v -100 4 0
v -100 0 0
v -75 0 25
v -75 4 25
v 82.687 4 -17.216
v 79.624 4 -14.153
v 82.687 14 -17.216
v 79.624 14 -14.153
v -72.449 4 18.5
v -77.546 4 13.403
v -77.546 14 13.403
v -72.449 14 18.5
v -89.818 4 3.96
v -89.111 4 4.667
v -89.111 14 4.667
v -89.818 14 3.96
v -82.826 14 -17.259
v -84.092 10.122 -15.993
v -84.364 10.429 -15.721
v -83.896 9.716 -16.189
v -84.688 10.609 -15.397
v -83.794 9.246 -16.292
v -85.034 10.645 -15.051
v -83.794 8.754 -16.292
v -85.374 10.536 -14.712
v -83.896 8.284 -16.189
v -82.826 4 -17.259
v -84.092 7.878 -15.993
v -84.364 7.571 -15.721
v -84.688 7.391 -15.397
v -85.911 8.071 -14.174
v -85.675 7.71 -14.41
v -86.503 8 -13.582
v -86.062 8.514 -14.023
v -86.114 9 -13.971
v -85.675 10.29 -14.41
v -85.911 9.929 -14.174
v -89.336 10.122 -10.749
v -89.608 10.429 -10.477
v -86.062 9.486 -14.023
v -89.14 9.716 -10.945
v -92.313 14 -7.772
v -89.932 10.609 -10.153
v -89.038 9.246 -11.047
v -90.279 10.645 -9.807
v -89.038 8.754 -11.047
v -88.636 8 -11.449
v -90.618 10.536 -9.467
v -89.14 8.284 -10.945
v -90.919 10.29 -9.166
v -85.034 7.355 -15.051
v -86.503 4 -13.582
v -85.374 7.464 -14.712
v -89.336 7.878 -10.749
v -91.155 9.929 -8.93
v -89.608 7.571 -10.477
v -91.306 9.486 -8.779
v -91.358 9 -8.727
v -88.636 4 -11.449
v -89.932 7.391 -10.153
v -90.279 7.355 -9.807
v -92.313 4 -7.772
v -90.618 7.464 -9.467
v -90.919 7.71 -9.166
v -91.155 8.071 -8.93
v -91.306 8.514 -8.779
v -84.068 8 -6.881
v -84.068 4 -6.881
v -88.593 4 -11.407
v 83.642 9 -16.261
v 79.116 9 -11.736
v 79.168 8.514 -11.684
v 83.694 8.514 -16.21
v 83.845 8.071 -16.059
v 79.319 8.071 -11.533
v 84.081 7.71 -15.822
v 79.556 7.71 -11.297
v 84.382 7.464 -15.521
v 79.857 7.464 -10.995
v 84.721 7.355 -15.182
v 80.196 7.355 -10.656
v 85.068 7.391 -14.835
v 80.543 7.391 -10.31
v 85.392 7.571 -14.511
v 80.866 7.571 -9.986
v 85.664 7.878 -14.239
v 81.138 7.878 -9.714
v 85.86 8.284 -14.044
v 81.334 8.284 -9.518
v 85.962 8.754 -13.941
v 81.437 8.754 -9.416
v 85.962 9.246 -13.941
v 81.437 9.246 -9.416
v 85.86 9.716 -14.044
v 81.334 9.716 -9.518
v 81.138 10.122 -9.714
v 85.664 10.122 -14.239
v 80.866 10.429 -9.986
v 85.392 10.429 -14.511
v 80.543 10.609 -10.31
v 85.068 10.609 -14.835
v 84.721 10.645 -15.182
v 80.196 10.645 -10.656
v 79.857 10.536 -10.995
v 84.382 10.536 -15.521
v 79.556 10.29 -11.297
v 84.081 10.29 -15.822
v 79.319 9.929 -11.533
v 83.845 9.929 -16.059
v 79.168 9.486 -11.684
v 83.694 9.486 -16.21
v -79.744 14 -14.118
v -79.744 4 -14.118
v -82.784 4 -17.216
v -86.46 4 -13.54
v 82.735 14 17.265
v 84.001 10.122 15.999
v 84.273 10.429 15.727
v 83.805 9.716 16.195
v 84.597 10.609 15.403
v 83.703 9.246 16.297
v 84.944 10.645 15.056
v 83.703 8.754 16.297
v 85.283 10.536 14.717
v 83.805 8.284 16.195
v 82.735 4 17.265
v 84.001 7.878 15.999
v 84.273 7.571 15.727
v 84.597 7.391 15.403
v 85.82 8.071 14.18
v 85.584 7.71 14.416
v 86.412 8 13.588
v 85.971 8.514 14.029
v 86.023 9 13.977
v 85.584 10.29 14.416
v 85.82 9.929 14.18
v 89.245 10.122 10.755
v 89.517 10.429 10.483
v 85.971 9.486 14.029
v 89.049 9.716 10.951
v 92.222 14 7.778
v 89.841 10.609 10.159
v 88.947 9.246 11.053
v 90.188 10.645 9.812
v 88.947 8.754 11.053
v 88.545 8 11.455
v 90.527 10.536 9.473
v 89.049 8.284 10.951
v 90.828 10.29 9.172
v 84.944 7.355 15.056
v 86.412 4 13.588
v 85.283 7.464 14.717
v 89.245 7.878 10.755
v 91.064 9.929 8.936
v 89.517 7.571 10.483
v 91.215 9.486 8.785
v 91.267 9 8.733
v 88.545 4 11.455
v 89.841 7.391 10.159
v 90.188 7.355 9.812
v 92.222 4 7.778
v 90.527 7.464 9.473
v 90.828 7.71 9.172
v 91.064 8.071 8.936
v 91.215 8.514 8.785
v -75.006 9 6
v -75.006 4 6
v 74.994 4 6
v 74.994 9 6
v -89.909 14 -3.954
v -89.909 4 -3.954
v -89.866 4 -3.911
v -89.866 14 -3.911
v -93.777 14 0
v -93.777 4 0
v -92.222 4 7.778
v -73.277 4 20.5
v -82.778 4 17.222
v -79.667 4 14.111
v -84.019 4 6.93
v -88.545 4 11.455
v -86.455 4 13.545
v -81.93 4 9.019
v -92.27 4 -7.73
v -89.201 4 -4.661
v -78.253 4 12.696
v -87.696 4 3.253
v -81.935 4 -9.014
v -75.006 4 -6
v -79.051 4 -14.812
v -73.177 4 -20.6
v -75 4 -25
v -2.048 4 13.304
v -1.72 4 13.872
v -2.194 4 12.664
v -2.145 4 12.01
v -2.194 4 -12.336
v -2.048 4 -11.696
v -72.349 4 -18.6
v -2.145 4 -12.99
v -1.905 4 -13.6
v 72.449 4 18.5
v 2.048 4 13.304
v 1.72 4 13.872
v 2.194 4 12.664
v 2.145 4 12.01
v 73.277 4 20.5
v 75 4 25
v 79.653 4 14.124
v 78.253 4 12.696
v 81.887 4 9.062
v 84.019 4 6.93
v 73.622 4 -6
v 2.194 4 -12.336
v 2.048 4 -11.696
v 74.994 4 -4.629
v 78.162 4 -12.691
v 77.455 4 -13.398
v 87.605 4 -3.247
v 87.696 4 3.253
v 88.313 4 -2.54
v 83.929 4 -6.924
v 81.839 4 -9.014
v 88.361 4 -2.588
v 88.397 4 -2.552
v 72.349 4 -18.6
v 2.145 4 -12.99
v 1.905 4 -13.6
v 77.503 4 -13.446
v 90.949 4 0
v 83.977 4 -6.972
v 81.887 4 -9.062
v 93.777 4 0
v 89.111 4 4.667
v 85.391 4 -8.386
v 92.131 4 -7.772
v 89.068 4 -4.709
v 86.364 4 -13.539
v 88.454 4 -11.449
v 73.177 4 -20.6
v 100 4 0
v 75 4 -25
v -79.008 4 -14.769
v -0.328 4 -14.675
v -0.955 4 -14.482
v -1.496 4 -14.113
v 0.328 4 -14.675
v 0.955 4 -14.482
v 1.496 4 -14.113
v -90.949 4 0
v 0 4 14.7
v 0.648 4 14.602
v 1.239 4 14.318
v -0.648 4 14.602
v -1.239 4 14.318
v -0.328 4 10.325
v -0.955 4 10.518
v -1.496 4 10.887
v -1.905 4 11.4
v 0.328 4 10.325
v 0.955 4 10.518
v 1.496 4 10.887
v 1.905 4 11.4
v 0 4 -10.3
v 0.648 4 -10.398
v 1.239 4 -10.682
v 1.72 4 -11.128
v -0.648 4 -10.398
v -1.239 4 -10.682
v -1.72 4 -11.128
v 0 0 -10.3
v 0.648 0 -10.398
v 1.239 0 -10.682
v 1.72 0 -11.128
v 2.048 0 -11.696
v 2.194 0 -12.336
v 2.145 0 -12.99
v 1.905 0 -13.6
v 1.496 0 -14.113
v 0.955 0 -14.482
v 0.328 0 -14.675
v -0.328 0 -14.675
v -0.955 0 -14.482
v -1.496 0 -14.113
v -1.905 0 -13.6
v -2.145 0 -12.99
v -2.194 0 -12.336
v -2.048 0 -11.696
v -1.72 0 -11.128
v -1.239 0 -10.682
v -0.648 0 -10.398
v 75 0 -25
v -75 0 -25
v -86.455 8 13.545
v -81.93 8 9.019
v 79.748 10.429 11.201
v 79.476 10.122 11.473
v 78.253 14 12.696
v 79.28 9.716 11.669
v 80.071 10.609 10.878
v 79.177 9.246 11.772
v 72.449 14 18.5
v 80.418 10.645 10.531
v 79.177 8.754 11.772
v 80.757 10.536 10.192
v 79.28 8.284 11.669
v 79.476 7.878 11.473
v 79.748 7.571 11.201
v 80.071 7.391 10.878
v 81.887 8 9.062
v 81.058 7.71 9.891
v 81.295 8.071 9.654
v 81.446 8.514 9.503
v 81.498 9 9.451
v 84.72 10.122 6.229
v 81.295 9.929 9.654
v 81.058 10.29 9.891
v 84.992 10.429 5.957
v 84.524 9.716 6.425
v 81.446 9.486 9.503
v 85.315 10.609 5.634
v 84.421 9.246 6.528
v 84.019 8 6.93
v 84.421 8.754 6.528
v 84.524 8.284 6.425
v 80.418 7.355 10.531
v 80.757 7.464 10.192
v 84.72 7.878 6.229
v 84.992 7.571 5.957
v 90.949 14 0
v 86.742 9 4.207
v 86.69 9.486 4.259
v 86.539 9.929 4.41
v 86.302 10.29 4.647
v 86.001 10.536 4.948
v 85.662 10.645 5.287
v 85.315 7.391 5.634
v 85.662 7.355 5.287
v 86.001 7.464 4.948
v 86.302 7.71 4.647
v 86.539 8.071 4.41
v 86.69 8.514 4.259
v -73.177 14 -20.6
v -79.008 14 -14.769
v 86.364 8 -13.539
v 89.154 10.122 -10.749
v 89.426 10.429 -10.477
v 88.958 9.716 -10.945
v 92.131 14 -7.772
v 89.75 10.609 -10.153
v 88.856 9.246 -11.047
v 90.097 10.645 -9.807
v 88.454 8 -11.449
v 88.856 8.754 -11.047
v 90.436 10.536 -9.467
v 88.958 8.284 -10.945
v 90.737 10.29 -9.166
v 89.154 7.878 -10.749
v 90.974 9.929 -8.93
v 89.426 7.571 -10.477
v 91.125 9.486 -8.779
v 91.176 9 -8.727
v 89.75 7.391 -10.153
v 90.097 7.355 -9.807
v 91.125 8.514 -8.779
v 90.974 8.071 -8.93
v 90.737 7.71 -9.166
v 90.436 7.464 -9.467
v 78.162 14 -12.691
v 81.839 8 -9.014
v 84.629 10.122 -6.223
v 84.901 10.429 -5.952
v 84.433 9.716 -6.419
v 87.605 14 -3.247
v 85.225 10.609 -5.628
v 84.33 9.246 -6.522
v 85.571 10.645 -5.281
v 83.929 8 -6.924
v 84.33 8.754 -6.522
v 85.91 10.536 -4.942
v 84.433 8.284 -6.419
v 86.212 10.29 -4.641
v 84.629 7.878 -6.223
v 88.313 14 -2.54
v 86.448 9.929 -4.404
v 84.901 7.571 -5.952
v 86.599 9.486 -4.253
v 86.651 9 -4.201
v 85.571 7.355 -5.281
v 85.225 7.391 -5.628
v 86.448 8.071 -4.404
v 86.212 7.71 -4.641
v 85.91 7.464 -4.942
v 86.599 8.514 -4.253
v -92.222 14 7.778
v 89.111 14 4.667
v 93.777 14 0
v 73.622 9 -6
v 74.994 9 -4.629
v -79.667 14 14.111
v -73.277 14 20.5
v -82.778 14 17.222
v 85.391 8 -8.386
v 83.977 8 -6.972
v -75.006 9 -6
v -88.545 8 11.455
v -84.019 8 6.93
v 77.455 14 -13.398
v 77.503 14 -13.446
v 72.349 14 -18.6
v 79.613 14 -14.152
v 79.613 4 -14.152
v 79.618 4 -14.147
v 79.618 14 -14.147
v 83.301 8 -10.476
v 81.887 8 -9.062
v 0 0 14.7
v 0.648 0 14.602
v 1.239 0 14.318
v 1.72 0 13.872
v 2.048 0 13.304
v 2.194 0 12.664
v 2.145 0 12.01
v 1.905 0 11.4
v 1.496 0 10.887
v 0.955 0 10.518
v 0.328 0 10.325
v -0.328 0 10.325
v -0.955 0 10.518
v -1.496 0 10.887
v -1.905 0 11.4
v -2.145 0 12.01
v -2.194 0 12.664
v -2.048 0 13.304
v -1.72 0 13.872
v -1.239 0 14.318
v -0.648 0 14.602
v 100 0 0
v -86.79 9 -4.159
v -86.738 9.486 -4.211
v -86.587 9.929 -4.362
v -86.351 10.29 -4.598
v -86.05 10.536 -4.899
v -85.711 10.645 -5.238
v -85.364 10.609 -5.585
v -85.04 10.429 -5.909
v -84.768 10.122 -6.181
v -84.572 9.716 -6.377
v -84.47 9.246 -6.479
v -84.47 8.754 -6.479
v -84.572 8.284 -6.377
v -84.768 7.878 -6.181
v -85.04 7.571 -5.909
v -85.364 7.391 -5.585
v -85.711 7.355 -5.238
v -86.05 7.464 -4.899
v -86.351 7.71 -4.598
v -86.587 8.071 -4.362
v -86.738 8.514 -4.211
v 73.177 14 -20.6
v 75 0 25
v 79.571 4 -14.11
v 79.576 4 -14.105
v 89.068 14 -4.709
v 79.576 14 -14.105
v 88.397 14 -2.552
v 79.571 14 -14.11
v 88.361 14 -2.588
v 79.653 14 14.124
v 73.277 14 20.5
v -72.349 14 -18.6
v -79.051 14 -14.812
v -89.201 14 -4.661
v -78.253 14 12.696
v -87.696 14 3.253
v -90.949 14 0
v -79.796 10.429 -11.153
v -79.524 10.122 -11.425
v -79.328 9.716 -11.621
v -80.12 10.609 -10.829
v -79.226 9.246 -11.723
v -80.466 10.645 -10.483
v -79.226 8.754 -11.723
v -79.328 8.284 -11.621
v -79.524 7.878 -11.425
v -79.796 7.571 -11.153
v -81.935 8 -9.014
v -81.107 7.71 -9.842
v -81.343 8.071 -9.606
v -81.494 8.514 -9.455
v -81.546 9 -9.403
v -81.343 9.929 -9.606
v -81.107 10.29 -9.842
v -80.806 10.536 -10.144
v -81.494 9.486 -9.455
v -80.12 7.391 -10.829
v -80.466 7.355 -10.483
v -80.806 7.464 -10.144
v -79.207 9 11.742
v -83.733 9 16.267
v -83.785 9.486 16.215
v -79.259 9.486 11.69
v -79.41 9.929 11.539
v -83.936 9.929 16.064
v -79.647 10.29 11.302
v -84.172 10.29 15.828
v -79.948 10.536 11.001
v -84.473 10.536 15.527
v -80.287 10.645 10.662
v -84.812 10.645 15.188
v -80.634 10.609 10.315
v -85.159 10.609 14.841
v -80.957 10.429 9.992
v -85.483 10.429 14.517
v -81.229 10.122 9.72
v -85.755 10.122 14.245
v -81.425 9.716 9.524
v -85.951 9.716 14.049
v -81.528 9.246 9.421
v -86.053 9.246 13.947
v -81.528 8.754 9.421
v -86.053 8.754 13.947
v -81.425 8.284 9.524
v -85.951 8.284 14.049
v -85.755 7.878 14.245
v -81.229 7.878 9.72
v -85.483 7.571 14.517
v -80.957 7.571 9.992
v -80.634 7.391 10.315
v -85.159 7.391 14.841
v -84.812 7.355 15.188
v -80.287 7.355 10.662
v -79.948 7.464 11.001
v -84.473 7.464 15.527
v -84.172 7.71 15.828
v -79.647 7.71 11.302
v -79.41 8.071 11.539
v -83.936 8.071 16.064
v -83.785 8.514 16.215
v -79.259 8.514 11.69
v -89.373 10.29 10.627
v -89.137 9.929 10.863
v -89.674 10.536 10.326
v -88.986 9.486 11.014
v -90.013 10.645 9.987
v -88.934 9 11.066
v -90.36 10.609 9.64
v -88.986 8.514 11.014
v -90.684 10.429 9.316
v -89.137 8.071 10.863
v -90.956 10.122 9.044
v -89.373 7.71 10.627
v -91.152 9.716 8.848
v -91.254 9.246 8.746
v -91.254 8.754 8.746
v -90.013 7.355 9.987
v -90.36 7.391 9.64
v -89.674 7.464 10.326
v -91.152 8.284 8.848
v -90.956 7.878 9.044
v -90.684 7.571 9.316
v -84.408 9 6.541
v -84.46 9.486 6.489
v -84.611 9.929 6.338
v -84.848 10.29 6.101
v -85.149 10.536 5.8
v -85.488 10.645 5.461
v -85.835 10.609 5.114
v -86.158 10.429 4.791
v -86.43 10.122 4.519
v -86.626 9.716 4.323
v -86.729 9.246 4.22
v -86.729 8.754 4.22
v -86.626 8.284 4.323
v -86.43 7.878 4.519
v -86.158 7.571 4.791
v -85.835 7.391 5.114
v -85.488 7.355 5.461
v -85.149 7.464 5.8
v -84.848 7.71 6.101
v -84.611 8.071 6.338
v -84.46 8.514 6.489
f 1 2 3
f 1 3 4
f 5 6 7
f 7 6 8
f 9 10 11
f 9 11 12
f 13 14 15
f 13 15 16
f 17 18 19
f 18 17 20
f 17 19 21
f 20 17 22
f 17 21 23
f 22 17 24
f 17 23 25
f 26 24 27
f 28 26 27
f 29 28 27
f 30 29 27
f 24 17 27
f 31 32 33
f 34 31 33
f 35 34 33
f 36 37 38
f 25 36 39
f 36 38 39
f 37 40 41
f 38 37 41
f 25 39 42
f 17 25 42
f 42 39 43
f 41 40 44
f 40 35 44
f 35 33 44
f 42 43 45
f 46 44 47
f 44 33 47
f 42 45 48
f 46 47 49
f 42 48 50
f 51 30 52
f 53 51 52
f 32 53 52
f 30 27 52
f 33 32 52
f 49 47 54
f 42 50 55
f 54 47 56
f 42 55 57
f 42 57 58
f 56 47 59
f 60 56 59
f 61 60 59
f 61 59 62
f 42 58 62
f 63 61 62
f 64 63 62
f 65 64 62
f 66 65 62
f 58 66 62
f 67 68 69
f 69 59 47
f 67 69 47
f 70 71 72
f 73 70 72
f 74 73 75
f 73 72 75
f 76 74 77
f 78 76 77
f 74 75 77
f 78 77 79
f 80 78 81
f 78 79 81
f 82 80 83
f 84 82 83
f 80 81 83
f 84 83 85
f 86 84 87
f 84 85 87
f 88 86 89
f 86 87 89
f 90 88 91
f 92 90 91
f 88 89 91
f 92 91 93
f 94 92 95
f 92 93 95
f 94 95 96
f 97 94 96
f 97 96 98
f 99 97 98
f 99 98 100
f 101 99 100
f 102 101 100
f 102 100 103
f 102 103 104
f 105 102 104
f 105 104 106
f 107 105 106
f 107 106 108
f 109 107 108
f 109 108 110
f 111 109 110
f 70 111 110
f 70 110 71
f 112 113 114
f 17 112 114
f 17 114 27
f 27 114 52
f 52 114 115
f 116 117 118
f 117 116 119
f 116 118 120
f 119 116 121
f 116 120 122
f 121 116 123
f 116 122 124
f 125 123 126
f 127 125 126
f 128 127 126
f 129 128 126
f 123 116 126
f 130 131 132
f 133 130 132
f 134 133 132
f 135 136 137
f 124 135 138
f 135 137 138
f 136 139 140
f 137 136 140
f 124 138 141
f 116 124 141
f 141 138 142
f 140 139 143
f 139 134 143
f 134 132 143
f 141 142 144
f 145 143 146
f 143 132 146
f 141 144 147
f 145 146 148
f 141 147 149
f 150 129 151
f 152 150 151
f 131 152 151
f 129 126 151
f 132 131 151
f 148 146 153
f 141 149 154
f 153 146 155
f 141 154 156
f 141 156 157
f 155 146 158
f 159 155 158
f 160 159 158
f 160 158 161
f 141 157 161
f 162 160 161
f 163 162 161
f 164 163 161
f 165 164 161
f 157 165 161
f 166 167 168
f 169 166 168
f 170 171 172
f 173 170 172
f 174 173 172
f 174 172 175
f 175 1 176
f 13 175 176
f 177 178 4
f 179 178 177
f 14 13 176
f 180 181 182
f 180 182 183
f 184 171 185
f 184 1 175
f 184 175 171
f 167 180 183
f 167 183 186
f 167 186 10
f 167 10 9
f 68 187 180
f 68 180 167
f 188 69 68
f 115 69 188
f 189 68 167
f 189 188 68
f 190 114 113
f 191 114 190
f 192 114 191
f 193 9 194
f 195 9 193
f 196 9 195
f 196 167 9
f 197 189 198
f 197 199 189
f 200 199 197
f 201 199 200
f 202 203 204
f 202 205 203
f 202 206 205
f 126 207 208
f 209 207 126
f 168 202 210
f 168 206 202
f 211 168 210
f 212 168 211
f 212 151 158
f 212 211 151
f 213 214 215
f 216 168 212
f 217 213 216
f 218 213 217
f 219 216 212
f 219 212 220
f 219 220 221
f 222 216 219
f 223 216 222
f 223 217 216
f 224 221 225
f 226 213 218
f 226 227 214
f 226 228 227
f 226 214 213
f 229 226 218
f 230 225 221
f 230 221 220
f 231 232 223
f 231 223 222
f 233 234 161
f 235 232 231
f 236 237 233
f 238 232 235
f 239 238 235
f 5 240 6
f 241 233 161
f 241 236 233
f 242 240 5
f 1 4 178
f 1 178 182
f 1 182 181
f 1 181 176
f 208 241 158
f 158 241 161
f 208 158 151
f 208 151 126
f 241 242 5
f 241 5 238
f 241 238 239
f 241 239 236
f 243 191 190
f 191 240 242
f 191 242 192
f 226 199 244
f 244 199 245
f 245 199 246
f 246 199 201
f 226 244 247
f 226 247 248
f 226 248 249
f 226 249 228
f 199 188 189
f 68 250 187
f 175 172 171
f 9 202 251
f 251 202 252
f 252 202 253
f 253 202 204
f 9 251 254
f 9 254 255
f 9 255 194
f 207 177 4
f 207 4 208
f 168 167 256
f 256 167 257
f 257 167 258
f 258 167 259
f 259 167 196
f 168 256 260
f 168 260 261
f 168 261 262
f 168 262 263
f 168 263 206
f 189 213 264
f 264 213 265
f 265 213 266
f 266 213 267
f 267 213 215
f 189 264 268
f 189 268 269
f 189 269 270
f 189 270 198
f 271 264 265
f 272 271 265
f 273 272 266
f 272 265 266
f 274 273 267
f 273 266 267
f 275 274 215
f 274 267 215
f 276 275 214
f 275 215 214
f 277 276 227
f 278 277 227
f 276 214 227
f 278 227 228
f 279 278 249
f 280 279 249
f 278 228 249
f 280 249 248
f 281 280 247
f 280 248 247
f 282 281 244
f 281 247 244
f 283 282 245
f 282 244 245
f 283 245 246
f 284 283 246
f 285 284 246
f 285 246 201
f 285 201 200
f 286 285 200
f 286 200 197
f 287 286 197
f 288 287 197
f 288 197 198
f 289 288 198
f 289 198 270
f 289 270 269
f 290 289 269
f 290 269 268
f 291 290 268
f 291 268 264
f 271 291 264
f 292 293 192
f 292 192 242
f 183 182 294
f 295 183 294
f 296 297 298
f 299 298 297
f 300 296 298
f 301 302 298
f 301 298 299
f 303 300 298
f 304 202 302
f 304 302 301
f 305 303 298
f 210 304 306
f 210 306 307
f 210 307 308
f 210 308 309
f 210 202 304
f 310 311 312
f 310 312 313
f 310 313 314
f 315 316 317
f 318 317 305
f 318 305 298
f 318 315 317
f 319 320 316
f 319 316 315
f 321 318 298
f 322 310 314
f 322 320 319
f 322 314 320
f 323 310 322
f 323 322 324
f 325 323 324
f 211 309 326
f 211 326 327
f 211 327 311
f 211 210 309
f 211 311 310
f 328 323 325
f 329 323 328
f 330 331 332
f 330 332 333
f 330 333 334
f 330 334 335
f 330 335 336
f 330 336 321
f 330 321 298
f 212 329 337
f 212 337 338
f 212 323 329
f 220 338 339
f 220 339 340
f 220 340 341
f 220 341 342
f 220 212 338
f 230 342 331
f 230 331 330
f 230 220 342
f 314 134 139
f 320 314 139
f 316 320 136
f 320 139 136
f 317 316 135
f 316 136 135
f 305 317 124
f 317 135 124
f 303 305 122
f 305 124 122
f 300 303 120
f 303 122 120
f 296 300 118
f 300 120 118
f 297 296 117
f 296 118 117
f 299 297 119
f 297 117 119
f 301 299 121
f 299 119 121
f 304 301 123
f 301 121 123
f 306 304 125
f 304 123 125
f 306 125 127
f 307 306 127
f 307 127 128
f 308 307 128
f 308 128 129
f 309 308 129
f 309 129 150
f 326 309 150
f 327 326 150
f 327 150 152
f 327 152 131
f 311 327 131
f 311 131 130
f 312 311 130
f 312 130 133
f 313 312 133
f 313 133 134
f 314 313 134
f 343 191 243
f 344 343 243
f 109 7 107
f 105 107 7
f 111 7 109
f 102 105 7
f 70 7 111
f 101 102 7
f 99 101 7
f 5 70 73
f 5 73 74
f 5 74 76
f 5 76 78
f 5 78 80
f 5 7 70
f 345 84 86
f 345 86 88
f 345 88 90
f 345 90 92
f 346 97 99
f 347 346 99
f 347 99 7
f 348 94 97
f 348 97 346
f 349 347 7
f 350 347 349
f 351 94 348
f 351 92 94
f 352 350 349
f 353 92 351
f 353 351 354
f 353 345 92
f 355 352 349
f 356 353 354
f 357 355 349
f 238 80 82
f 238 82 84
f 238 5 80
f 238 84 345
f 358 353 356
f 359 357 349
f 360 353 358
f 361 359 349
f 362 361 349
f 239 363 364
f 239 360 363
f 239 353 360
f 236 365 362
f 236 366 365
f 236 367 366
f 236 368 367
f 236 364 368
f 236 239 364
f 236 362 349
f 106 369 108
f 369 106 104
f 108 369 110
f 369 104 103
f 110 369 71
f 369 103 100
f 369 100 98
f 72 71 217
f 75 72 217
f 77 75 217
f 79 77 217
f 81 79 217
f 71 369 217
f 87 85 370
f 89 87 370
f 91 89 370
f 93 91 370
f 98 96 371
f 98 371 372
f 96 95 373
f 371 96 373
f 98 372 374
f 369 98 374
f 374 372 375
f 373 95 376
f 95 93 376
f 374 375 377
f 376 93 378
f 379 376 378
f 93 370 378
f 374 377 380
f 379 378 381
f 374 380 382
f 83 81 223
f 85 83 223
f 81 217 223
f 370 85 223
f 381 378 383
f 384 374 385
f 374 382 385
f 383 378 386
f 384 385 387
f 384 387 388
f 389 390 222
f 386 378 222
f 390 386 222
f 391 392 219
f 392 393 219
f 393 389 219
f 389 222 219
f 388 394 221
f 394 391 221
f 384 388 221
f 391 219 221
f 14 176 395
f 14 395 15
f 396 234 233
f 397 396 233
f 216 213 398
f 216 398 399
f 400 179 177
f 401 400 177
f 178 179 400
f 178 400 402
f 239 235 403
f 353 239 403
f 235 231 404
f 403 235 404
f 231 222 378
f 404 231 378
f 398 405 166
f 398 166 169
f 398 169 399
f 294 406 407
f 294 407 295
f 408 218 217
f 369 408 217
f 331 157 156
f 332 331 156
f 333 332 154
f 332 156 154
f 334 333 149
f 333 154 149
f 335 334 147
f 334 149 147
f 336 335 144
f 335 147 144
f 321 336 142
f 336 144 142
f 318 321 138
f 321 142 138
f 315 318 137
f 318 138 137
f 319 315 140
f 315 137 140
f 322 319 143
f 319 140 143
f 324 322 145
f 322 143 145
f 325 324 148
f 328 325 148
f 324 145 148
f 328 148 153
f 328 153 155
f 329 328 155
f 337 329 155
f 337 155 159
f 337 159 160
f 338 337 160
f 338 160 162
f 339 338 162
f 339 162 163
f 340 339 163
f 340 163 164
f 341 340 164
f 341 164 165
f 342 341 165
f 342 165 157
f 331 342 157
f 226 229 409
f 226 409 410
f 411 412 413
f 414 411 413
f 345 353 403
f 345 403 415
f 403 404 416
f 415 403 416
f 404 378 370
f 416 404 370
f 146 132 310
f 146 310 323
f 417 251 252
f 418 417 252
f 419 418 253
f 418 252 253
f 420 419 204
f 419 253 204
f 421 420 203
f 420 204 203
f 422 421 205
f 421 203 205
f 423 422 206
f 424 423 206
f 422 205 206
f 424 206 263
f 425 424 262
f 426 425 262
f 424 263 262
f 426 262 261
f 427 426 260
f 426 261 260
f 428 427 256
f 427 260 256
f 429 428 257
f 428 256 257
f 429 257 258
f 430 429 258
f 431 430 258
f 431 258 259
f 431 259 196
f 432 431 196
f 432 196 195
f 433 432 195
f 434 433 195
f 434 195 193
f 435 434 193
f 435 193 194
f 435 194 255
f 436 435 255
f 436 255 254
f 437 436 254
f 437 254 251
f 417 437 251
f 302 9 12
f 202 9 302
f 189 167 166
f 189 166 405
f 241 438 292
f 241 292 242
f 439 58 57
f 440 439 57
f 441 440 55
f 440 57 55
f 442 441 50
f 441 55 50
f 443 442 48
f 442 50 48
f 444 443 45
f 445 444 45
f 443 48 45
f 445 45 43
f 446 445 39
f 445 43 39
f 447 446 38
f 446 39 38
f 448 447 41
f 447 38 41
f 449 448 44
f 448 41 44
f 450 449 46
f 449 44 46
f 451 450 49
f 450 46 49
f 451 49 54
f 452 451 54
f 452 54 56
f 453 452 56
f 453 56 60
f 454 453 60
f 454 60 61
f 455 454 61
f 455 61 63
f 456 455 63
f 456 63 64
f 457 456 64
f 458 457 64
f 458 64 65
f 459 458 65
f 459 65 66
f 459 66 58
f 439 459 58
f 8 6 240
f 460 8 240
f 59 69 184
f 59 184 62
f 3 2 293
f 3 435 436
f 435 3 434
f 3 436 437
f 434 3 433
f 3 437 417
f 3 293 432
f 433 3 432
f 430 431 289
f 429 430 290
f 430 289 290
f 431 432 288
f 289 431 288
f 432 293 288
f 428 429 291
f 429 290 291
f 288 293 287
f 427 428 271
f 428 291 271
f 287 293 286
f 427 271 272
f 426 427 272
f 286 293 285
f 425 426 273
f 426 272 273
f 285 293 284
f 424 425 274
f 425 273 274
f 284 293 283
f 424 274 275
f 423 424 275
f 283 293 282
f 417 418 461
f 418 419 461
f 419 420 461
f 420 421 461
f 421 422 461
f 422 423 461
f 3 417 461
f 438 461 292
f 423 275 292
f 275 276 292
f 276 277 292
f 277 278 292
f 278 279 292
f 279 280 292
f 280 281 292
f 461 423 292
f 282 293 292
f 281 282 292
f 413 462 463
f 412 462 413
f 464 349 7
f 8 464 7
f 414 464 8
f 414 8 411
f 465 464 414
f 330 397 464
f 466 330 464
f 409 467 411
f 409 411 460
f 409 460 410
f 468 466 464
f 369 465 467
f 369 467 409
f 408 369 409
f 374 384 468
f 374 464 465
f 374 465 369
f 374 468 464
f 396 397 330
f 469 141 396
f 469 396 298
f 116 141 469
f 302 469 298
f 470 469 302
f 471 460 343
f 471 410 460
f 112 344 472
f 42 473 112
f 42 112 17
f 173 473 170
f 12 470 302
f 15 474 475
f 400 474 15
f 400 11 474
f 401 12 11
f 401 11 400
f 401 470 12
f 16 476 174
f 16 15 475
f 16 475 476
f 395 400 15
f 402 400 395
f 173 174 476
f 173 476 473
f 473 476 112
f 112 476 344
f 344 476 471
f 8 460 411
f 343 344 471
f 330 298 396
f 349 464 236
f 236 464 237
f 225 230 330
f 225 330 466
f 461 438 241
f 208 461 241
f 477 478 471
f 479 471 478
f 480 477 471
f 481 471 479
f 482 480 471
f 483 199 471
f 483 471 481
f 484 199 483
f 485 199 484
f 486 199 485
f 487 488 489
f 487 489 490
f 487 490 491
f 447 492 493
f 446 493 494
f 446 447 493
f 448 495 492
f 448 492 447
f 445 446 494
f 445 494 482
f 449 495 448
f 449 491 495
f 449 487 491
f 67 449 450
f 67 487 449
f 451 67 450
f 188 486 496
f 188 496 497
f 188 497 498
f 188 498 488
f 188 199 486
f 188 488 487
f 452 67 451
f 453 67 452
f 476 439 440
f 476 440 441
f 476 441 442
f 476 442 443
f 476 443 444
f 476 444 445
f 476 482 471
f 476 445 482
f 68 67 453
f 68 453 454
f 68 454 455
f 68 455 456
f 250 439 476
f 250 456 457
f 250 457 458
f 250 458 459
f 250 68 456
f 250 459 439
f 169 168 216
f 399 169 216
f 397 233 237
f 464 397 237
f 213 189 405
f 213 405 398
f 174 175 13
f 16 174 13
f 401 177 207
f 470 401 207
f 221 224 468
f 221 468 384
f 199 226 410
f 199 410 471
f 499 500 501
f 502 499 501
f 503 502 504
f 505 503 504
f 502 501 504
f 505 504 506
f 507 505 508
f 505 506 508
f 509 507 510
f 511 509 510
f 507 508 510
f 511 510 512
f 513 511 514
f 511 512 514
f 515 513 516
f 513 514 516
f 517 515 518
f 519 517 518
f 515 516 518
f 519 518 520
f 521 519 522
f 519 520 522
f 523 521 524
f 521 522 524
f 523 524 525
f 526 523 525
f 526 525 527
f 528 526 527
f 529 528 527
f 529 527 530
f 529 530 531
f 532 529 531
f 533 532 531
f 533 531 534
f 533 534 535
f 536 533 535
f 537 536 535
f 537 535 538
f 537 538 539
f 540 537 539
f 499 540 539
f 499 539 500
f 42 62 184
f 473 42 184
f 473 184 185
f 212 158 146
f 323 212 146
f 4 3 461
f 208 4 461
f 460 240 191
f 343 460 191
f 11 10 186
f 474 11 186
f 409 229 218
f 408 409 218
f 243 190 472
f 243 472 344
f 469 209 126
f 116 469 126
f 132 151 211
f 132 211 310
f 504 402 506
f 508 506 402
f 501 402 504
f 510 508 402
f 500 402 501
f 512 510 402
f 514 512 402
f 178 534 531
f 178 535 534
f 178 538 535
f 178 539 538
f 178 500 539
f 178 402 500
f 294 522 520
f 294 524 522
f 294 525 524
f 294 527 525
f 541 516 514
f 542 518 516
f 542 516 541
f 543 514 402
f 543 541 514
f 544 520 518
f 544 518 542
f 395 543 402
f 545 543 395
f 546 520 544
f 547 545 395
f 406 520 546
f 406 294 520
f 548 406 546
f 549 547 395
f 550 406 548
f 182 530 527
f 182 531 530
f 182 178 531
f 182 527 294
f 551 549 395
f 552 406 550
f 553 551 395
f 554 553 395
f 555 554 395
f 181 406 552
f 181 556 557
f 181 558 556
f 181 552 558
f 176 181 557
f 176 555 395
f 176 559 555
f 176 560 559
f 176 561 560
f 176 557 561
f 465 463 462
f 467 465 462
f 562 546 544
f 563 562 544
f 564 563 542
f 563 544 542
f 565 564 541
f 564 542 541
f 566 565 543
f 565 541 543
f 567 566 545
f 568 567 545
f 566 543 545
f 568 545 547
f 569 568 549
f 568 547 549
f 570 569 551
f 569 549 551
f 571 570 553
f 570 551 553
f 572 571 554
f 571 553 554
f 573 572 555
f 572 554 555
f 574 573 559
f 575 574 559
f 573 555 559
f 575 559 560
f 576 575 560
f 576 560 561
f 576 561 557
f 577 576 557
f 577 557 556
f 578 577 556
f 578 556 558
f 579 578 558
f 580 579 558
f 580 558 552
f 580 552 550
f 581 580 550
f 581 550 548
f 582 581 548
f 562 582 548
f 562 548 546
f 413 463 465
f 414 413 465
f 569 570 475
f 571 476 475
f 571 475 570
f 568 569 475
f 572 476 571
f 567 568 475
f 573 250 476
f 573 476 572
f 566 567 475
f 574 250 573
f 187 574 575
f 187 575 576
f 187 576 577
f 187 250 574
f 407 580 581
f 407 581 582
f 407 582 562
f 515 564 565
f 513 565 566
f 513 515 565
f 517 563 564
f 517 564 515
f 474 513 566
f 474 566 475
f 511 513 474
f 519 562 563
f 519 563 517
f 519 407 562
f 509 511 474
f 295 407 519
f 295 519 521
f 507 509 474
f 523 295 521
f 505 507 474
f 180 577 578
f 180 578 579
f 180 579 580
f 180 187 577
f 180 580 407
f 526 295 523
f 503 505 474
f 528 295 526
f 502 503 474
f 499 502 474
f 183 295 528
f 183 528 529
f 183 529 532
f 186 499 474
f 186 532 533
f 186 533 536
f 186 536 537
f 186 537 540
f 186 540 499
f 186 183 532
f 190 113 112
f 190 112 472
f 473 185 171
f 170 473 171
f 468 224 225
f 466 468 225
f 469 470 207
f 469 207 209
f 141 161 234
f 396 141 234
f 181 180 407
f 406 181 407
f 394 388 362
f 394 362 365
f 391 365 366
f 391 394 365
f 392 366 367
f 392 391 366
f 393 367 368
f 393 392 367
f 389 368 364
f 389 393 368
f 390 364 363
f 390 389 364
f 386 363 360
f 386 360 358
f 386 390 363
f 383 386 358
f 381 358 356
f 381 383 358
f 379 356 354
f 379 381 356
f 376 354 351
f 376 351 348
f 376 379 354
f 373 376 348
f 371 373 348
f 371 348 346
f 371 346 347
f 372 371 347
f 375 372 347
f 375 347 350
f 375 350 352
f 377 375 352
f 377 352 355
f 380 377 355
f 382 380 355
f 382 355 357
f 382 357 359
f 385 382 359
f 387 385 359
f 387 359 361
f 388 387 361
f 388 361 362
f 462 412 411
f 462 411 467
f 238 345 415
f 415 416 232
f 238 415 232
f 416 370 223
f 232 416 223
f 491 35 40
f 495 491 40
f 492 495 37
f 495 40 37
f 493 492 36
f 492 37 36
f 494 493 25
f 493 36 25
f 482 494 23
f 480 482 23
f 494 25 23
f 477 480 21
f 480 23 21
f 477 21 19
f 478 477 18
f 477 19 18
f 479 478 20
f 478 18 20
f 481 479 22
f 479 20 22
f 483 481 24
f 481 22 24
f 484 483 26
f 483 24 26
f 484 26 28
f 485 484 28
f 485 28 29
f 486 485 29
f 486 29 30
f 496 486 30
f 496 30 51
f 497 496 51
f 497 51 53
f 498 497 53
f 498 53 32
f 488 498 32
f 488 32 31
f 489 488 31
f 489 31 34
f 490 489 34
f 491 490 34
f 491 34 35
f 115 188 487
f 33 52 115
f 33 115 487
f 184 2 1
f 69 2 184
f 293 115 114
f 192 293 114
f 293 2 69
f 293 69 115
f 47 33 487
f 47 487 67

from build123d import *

# Parameters (mm, degrees)
SKIZZE1_W                       = 200
SKIZZE1_H                       = 50
AUFSATZ_LINEAR_AUSTRAGEN1_DEPTH = 4
FASE1_SIZE                      = 25
AUFSATZ_LINEAR_AUSTRAGEN2_DEPTH = 10
SKIZZE3_W                       = 15.35533906
SKIZZE3_H                       = 10
SCHNITT_LINEAR_AUSTRAGEN1_DEPTH = 10
SKIZZE4_W                       = 15.35533906
SKIZZE4_H                       = 10
SCHNITT_LINEAR_AUSTRAGEN2_DEPTH = 10
SKIZZE5_W                       = 150
SKIZZE5_H                       = 12
AUFSATZ_LINEAR_AUSTRAGEN3_DEPTH = 5
AUFSATZ_LINEAR_AUSTRAGEN4_DEPTH = 10
AUFSATZ_LINEAR_AUSTRAGEN5_DEPTH = 10
SKIZZE11_R                      = 1.65
SKIZZE11_W                      = 2.95533906
SKIZZE11_H                      = 4
SCHNITT_LINEAR_AUSTRAGEN7_DEPTH = 10
SKIZZE12_R                      = 2.2
SCHNITT_LINEAR_AUSTRAGEN8_DEPTH = 10
AUFSATZ_LINEAR_AUSTRAGEN6_DEPTH = 10
SKIZZE8_R                       = 1.65
SKIZZE8_W                       = 3.016289267
SKIZZE8_H                       = 4
SCHNITT_LINEAR_AUSTRAGEN9_DEPTH = 10
KREISMUSTER1_START              = 56.301499416
KREISMUSTER1_OUTLINE_R          = 1.65
KREISMUSTER1_DEPTH              = 0.969560509
KREISMUSTER1_START_2            = 64.310678119
KREISMUSTER1_2_OUTLINE_W        = 0.949011964
KREISMUSTER1_2_OUTLINE_H        = 10
KREISMUSTER1_2_OUTLINE_R        = 1.65
KREISMUSTER1_2_OUTLINE_W_2      = 1.050988037
KREISMUSTER1_2_OUTLINE_W_3      = 2.955339059
KREISMUSTER1_2_OUTLINE_H_2      = 4
KREISMUSTER1_2_DEPTH            = 1.990821297
KREISMUSTER1_START_3            = 66.301499416
KREISMUSTER1_3_OUTLINE_R        = 1.65
KREISMUSTER1_3_OUTLINE_W        = 2.955339059
KREISMUSTER1_3_OUTLINE_H        = 4
KREISMUSTER1_3_DEPTH            = 0.009178703
KREISMUSTER1_START_4            = 64.242319383
KREISMUSTER1_4_OUTLINE_R        = 1.65
KREISMUSTER1_4_DEPTH            = 6.4
AUFSATZ_LINEAR_AUSTRAGEN7_DEPTH = 10
KREISMUSTER2_COUNT              = 2


# Read off the part's stored shape, not the designer's step: Kreismuster1
with BuildPart() as part:
    # Skizze1 → Aufsatz-Linear austragen1 (new body)
    with BuildSketch(Plane(origin=(0, 0, 0), x_dir=(1, 0, 0), z_dir=(0, 1, 0))):
        Rectangle(SKIZZE1_W, SKIZZE1_H)
    extrude(amount=AUFSATZ_LINEAR_AUSTRAGEN1_DEPTH)

    # Fase1
    fase1_edges = [part.edges().sort_by_distance(p)[0] for p in [
        (-100, 2, -25),
        (-100, 2, 25),
        (100, 2, -25),
        (100, 2, 25),
    ]]
    chamfer(fase1_edges, length=FASE1_SIZE - 0.0001)  # a hair under: the kernel refuses the full size

    # Skizze2 → Aufsatz-Linear austragen2 (add)
    with BuildSketch(Plane(origin=(0, 4, 0), x_dir=(1, 0, 0), z_dir=(0, 1, 0))):
        Polygon((-73.177460326, 20.6), (-93.777460326, 0), (-73.277460326, -20.5), (73.277460326, -20.5), (93.777460326, 0), (73.177460326, 20.6), align=None)
        Polygon((90.949033201, 0), (72.349033201, 18.6), (-72.349033201, 18.6), (-90.949033201, 0), (-72.449033201, -18.5), (72.449033201, -18.5), align=None, mode=Mode.SUBTRACT)
    extrude(amount=AUFSATZ_LINEAR_AUSTRAGEN2_DEPTH)

    # Skizze3 → Schnitt-Linear austragen1 (cut)
    with BuildSketch(Plane(origin=(-46.888730163, 0, 46.888730163), x_dir=(0.7071067811865476, 0, 0.7071067811865476), z_dir=(-0.7071067811865476, 0, 0.7071067811865476))):
        with Locations((-53.033008589, 9)):
            Rectangle(SKIZZE3_W, SKIZZE3_H)
    extrude(amount=-SCHNITT_LINEAR_AUSTRAGEN1_DEPTH, mode=Mode.SUBTRACT)

    # Skizze4 → Schnitt-Linear austragen2 (cut)
    with BuildSketch(Plane(origin=(46.888730163, 0, 46.888730163), x_dir=(0.7071067811865475, 0, -0.7071067811865477), z_dir=(0.7071067811865477, 0, 0.7071067811865475))):
        with Locations((53.033008589, 9)):
            Rectangle(SKIZZE4_W, SKIZZE4_H)
    extrude(amount=-SCHNITT_LINEAR_AUSTRAGEN2_DEPTH, mode=Mode.SUBTRACT)

    # Skizze5 → Aufsatz-Linear austragen3 (add)
    with BuildSketch(Plane(origin=(0, 4, 0), x_dir=(1, 0, 0), z_dir=(0, 1, 0))):
        with Locations((-0.006490323, 0)):
            Rectangle(SKIZZE5_W, SKIZZE5_H)
    extrude(amount=AUFSATZ_LINEAR_AUSTRAGEN3_DEPTH)

    # Skizze6 → Aufsatz-Linear austragen4 (add)
    with BuildSketch(Plane(origin=(0, 4, 0), x_dir=(1, 0, 0), z_dir=(0, 1, 0))):
        Polygon((87.696342007, -3.252691193), (78.252691193, -12.696342007), (82.735076288, -17.264923712), (92.221825407, -7.778174593), align=None)
    aufsatz_linear_austragen4 = extrude(amount=AUFSATZ_LINEAR_AUSTRAGEN4_DEPTH)

    # Skizze10 → Aufsatz-Linear austragen5 (add)
    with BuildSketch(Plane(origin=(0, 4, 0), x_dir=(1, 0, 0), z_dir=(0, 1, 0))):
        Polygon((-87.696342007, -3.252691193), (-78.252691193, -12.696342007), (-82.778174593, -17.221825407), (-92.221825407, -7.778174593), align=None)
    extrude(amount=AUFSATZ_LINEAR_AUSTRAGEN5_DEPTH)

    # Skizze11 → Schnitt-Linear austragen7 (cut)
    with BuildSketch(Plane(origin=(-50, 0, 50), x_dir=(0.7071067811865465, 0, 0.7071067811865488), z_dir=(-0.7071067811865488, 0, 0.7071067811865465))):
        with Locations((-56.710678119, 9)):
            Circle(SKIZZE11_R)
        with Locations((-49.355339059, 9)):
            Circle(SKIZZE11_R)
        with Locations((-53.033008589, 6)):
            Rectangle(SKIZZE11_W, SKIZZE11_H)
    extrude(amount=-SCHNITT_LINEAR_AUSTRAGEN7_DEPTH, mode=Mode.SUBTRACT)

    # Skizze12 → Schnitt-Linear austragen8 (cut)
    with BuildSketch(Plane(origin=(0, 4, 0), x_dir=(1, 0, 0), z_dir=(0, 1, 0))):
        with Locations(Location((0, 12.5, 0), (0, 0, 270))):
            Circle(SKIZZE12_R)
        with Locations(Location((0, -12.5, 0), (0, 0, 270))):
            Circle(SKIZZE12_R)
    extrude(amount=-SCHNITT_LINEAR_AUSTRAGEN8_DEPTH, mode=Mode.SUBTRACT)

    # Skizze13 → Aufsatz-Linear austragen6 (add)
    with BuildSketch(Plane(origin=(0, 4, 0), x_dir=(1, 0, 0), z_dir=(0, 1, 0))):
        Polygon((89.817662351, -3.959797975), (88.403448789, -2.545584412), (87.69285367, -3.256179531), (89.107067232, -4.670393094), align=None)
        Polygon((-89.817662351, -3.959797975), (-88.403448789, -2.545584412), (-87.689553601, -3.2594796), (-89.103767163, -4.673693162), align=None)
        Polygon((78.959797975, -14.817662351), (77.545584412, -13.403448789), (78.257117259, -12.691915942), (79.671330821, -14.106129505), align=None)
        Polygon((-78.959797975, -14.817662351), (-77.545584412, -13.403448789), (-78.262212477, -12.686820723), (-79.67642604, -14.101034286), align=None)
    aufsatz_linear_austragen6 = extrude(amount=AUFSATZ_LINEAR_AUSTRAGEN6_DEPTH)

    # Skizze8 → Schnitt-Linear austragen9 (cut)
    with BuildSketch(Plane(origin=(50, 0, 50), x_dir=(0.7071067811865488, 0, -0.7071067811865465), z_dir=(0.7071067811865465, 0, 0.7071067811865488))):
        with Locations((49.294388852, 9)):
            Circle(SKIZZE8_R)
        with Locations((56.710678119, 9)):
            Circle(SKIZZE8_R)
        with Locations((53.002533486, 6)):
            Rectangle(SKIZZE8_W, SKIZZE8_H)
    schnitt_linear_austragen9 = extrude(amount=-SCHNITT_LINEAR_AUSTRAGEN9_DEPTH, mode=Mode.SUBTRACT)

    # Kreismuster1 outline → Kreismuster1 (cut)
    with BuildSketch(Plane(origin=(0, 0, 0), x_dir=(0.707106781186546, 0, 0.707106781186549), z_dir=(0.707106781186549, 0, -0.707106781186546)).offset(KREISMUSTER1_START)):
        Polygon((46.29517232, -9), (46.29517232, -14), (59.650511379, -14), (59.650511379, -4), (54.450511379, -4), (54.450511379, -8), (51.49517232, -8), (51.49517232, -4), (46.29517232, -4), align=None)
        with BuildLine():
            Line((47.64517232, -9), (50.94517232, -9))
            ThreePointArc((50.94517232, -9), (49.29517232, -10.65), (47.64517232, -9))
        make_face(mode=Mode.SUBTRACT)
        with Locations((56.650511379, -9)):
            Circle(KREISMUSTER1_OUTLINE_R, mode=Mode.SUBTRACT)
    extrude(amount=KREISMUSTER1_DEPTH, mode=Mode.SUBTRACT)

    # Kreismuster1 2 outline → Kreismuster1 2 (cut)
    with BuildSketch(Plane(origin=(0, 0, 0), x_dir=(0.707106781186546, 0, 0.707106781186549), z_dir=(0.707106781186549, 0, -0.707106781186546)).offset(KREISMUSTER1_START_2)):
        with Locations((45.820666338, -9)):
            Rectangle(KREISMUSTER1_2_OUTLINE_W, KREISMUSTER1_2_OUTLINE_H)
        with Locations((56.650511379, -9)):
            Circle(KREISMUSTER1_2_OUTLINE_R)
        with Locations((49.29517232, -9)):
            Circle(KREISMUSTER1_2_OUTLINE_R)
        with Locations((60.176005398, -9)):
            Rectangle(KREISMUSTER1_2_OUTLINE_W_2, KREISMUSTER1_2_OUTLINE_H)
        with Locations((52.972841849, -6)):
            Rectangle(KREISMUSTER1_2_OUTLINE_W_3, KREISMUSTER1_2_OUTLINE_H_2)
    extrude(amount=KREISMUSTER1_2_DEPTH, mode=Mode.SUBTRACT)

    # Kreismuster1 3 outline → Kreismuster1 3 (cut)
    with BuildSketch(Plane(origin=(0, 0, 0), x_dir=(0.707106781186546, 0, 0.707106781186549), z_dir=(0.707106781186549, 0, -0.707106781186546)).offset(KREISMUSTER1_START_3)):
        with Locations((56.650511379, -9)):
            Circle(KREISMUSTER1_3_OUTLINE_R)
        with Locations((49.29517232, -9)):
            Circle(KREISMUSTER1_3_OUTLINE_R)
        with Locations((52.972841849, -6)):
            Rectangle(KREISMUSTER1_3_OUTLINE_W, KREISMUSTER1_3_OUTLINE_H)
    extrude(amount=KREISMUSTER1_3_DEPTH, mode=Mode.SUBTRACT)

    # Kreismuster1 4 outline → Kreismuster1 4 (add)
    with BuildSketch(Plane(origin=(0, 0, 0), x_dir=(0.707106781186546, 0, 0.707106781186549), z_dir=(0.707106781186549, 0, -0.707106781186546)).offset(KREISMUSTER1_START_4)):
        Polygon((46.29517232, -9), (46.29517232, -14), (59.650511379, -14), (59.650511379, -4), (54.450511379, -4), (54.450511379, -8), (51.49517232, -8), (51.49517232, -4), (46.29517232, -4), align=None)
        with BuildLine():
            ThreePointArc((50.94517232, -9), (49.29517232, -10.65), (47.64517232, -9))
            ThreePointArc((47.64517232, -9), (49.29517232, -7.35), (50.94517232, -9))
        make_face(mode=Mode.SUBTRACT)
        with Locations((56.650511379, -9)):
            Circle(KREISMUSTER1_4_OUTLINE_R, mode=Mode.SUBTRACT)
    extrude(amount=KREISMUSTER1_4_DEPTH)

    # Skizze14 → Aufsatz-Linear austragen7 (add)
    with BuildSketch(Plane(origin=(0, 4, 0), x_dir=(1, 0, 0), z_dir=(0, 1, 0))):
        Polygon((88.396958465, 2.552074735), (89.804681705, 3.959797975), (89.061520937, 4.702958742), (87.653797698, 3.295235503), align=None)
        Polygon((77.539094089, 13.409939112), (78.946817328, 14.817662351), (79.612825848, 14.151653831), (78.205102609, 12.743930592), align=None)
    extrude(amount=AUFSATZ_LINEAR_AUSTRAGEN7_DEPTH)

    # Kreismuster2: Aufsatz-Linear austragen4, Aufsatz-Linear austragen6, Schnitt-Linear austragen9 ×2 about axis
    kreismuster2_axis = Axis((-0.045440618, 0, 0.002896308), (0, 1, 0))
    add([aufsatz_linear_austragen4.rotate(kreismuster2_axis, i * 360 / KREISMUSTER2_COUNT) for i in range(1, KREISMUSTER2_COUNT)])
    add([aufsatz_linear_austragen6.rotate(kreismuster2_axis, i * 360 / KREISMUSTER2_COUNT) for i in range(1, KREISMUSTER2_COUNT)])
    add([schnitt_linear_austragen9.rotate(kreismuster2_axis, i * 360 / KREISMUSTER2_COUNT) for i in range(1, KREISMUSTER2_COUNT)], mode=Mode.SUBTRACT)


solid = part.part
